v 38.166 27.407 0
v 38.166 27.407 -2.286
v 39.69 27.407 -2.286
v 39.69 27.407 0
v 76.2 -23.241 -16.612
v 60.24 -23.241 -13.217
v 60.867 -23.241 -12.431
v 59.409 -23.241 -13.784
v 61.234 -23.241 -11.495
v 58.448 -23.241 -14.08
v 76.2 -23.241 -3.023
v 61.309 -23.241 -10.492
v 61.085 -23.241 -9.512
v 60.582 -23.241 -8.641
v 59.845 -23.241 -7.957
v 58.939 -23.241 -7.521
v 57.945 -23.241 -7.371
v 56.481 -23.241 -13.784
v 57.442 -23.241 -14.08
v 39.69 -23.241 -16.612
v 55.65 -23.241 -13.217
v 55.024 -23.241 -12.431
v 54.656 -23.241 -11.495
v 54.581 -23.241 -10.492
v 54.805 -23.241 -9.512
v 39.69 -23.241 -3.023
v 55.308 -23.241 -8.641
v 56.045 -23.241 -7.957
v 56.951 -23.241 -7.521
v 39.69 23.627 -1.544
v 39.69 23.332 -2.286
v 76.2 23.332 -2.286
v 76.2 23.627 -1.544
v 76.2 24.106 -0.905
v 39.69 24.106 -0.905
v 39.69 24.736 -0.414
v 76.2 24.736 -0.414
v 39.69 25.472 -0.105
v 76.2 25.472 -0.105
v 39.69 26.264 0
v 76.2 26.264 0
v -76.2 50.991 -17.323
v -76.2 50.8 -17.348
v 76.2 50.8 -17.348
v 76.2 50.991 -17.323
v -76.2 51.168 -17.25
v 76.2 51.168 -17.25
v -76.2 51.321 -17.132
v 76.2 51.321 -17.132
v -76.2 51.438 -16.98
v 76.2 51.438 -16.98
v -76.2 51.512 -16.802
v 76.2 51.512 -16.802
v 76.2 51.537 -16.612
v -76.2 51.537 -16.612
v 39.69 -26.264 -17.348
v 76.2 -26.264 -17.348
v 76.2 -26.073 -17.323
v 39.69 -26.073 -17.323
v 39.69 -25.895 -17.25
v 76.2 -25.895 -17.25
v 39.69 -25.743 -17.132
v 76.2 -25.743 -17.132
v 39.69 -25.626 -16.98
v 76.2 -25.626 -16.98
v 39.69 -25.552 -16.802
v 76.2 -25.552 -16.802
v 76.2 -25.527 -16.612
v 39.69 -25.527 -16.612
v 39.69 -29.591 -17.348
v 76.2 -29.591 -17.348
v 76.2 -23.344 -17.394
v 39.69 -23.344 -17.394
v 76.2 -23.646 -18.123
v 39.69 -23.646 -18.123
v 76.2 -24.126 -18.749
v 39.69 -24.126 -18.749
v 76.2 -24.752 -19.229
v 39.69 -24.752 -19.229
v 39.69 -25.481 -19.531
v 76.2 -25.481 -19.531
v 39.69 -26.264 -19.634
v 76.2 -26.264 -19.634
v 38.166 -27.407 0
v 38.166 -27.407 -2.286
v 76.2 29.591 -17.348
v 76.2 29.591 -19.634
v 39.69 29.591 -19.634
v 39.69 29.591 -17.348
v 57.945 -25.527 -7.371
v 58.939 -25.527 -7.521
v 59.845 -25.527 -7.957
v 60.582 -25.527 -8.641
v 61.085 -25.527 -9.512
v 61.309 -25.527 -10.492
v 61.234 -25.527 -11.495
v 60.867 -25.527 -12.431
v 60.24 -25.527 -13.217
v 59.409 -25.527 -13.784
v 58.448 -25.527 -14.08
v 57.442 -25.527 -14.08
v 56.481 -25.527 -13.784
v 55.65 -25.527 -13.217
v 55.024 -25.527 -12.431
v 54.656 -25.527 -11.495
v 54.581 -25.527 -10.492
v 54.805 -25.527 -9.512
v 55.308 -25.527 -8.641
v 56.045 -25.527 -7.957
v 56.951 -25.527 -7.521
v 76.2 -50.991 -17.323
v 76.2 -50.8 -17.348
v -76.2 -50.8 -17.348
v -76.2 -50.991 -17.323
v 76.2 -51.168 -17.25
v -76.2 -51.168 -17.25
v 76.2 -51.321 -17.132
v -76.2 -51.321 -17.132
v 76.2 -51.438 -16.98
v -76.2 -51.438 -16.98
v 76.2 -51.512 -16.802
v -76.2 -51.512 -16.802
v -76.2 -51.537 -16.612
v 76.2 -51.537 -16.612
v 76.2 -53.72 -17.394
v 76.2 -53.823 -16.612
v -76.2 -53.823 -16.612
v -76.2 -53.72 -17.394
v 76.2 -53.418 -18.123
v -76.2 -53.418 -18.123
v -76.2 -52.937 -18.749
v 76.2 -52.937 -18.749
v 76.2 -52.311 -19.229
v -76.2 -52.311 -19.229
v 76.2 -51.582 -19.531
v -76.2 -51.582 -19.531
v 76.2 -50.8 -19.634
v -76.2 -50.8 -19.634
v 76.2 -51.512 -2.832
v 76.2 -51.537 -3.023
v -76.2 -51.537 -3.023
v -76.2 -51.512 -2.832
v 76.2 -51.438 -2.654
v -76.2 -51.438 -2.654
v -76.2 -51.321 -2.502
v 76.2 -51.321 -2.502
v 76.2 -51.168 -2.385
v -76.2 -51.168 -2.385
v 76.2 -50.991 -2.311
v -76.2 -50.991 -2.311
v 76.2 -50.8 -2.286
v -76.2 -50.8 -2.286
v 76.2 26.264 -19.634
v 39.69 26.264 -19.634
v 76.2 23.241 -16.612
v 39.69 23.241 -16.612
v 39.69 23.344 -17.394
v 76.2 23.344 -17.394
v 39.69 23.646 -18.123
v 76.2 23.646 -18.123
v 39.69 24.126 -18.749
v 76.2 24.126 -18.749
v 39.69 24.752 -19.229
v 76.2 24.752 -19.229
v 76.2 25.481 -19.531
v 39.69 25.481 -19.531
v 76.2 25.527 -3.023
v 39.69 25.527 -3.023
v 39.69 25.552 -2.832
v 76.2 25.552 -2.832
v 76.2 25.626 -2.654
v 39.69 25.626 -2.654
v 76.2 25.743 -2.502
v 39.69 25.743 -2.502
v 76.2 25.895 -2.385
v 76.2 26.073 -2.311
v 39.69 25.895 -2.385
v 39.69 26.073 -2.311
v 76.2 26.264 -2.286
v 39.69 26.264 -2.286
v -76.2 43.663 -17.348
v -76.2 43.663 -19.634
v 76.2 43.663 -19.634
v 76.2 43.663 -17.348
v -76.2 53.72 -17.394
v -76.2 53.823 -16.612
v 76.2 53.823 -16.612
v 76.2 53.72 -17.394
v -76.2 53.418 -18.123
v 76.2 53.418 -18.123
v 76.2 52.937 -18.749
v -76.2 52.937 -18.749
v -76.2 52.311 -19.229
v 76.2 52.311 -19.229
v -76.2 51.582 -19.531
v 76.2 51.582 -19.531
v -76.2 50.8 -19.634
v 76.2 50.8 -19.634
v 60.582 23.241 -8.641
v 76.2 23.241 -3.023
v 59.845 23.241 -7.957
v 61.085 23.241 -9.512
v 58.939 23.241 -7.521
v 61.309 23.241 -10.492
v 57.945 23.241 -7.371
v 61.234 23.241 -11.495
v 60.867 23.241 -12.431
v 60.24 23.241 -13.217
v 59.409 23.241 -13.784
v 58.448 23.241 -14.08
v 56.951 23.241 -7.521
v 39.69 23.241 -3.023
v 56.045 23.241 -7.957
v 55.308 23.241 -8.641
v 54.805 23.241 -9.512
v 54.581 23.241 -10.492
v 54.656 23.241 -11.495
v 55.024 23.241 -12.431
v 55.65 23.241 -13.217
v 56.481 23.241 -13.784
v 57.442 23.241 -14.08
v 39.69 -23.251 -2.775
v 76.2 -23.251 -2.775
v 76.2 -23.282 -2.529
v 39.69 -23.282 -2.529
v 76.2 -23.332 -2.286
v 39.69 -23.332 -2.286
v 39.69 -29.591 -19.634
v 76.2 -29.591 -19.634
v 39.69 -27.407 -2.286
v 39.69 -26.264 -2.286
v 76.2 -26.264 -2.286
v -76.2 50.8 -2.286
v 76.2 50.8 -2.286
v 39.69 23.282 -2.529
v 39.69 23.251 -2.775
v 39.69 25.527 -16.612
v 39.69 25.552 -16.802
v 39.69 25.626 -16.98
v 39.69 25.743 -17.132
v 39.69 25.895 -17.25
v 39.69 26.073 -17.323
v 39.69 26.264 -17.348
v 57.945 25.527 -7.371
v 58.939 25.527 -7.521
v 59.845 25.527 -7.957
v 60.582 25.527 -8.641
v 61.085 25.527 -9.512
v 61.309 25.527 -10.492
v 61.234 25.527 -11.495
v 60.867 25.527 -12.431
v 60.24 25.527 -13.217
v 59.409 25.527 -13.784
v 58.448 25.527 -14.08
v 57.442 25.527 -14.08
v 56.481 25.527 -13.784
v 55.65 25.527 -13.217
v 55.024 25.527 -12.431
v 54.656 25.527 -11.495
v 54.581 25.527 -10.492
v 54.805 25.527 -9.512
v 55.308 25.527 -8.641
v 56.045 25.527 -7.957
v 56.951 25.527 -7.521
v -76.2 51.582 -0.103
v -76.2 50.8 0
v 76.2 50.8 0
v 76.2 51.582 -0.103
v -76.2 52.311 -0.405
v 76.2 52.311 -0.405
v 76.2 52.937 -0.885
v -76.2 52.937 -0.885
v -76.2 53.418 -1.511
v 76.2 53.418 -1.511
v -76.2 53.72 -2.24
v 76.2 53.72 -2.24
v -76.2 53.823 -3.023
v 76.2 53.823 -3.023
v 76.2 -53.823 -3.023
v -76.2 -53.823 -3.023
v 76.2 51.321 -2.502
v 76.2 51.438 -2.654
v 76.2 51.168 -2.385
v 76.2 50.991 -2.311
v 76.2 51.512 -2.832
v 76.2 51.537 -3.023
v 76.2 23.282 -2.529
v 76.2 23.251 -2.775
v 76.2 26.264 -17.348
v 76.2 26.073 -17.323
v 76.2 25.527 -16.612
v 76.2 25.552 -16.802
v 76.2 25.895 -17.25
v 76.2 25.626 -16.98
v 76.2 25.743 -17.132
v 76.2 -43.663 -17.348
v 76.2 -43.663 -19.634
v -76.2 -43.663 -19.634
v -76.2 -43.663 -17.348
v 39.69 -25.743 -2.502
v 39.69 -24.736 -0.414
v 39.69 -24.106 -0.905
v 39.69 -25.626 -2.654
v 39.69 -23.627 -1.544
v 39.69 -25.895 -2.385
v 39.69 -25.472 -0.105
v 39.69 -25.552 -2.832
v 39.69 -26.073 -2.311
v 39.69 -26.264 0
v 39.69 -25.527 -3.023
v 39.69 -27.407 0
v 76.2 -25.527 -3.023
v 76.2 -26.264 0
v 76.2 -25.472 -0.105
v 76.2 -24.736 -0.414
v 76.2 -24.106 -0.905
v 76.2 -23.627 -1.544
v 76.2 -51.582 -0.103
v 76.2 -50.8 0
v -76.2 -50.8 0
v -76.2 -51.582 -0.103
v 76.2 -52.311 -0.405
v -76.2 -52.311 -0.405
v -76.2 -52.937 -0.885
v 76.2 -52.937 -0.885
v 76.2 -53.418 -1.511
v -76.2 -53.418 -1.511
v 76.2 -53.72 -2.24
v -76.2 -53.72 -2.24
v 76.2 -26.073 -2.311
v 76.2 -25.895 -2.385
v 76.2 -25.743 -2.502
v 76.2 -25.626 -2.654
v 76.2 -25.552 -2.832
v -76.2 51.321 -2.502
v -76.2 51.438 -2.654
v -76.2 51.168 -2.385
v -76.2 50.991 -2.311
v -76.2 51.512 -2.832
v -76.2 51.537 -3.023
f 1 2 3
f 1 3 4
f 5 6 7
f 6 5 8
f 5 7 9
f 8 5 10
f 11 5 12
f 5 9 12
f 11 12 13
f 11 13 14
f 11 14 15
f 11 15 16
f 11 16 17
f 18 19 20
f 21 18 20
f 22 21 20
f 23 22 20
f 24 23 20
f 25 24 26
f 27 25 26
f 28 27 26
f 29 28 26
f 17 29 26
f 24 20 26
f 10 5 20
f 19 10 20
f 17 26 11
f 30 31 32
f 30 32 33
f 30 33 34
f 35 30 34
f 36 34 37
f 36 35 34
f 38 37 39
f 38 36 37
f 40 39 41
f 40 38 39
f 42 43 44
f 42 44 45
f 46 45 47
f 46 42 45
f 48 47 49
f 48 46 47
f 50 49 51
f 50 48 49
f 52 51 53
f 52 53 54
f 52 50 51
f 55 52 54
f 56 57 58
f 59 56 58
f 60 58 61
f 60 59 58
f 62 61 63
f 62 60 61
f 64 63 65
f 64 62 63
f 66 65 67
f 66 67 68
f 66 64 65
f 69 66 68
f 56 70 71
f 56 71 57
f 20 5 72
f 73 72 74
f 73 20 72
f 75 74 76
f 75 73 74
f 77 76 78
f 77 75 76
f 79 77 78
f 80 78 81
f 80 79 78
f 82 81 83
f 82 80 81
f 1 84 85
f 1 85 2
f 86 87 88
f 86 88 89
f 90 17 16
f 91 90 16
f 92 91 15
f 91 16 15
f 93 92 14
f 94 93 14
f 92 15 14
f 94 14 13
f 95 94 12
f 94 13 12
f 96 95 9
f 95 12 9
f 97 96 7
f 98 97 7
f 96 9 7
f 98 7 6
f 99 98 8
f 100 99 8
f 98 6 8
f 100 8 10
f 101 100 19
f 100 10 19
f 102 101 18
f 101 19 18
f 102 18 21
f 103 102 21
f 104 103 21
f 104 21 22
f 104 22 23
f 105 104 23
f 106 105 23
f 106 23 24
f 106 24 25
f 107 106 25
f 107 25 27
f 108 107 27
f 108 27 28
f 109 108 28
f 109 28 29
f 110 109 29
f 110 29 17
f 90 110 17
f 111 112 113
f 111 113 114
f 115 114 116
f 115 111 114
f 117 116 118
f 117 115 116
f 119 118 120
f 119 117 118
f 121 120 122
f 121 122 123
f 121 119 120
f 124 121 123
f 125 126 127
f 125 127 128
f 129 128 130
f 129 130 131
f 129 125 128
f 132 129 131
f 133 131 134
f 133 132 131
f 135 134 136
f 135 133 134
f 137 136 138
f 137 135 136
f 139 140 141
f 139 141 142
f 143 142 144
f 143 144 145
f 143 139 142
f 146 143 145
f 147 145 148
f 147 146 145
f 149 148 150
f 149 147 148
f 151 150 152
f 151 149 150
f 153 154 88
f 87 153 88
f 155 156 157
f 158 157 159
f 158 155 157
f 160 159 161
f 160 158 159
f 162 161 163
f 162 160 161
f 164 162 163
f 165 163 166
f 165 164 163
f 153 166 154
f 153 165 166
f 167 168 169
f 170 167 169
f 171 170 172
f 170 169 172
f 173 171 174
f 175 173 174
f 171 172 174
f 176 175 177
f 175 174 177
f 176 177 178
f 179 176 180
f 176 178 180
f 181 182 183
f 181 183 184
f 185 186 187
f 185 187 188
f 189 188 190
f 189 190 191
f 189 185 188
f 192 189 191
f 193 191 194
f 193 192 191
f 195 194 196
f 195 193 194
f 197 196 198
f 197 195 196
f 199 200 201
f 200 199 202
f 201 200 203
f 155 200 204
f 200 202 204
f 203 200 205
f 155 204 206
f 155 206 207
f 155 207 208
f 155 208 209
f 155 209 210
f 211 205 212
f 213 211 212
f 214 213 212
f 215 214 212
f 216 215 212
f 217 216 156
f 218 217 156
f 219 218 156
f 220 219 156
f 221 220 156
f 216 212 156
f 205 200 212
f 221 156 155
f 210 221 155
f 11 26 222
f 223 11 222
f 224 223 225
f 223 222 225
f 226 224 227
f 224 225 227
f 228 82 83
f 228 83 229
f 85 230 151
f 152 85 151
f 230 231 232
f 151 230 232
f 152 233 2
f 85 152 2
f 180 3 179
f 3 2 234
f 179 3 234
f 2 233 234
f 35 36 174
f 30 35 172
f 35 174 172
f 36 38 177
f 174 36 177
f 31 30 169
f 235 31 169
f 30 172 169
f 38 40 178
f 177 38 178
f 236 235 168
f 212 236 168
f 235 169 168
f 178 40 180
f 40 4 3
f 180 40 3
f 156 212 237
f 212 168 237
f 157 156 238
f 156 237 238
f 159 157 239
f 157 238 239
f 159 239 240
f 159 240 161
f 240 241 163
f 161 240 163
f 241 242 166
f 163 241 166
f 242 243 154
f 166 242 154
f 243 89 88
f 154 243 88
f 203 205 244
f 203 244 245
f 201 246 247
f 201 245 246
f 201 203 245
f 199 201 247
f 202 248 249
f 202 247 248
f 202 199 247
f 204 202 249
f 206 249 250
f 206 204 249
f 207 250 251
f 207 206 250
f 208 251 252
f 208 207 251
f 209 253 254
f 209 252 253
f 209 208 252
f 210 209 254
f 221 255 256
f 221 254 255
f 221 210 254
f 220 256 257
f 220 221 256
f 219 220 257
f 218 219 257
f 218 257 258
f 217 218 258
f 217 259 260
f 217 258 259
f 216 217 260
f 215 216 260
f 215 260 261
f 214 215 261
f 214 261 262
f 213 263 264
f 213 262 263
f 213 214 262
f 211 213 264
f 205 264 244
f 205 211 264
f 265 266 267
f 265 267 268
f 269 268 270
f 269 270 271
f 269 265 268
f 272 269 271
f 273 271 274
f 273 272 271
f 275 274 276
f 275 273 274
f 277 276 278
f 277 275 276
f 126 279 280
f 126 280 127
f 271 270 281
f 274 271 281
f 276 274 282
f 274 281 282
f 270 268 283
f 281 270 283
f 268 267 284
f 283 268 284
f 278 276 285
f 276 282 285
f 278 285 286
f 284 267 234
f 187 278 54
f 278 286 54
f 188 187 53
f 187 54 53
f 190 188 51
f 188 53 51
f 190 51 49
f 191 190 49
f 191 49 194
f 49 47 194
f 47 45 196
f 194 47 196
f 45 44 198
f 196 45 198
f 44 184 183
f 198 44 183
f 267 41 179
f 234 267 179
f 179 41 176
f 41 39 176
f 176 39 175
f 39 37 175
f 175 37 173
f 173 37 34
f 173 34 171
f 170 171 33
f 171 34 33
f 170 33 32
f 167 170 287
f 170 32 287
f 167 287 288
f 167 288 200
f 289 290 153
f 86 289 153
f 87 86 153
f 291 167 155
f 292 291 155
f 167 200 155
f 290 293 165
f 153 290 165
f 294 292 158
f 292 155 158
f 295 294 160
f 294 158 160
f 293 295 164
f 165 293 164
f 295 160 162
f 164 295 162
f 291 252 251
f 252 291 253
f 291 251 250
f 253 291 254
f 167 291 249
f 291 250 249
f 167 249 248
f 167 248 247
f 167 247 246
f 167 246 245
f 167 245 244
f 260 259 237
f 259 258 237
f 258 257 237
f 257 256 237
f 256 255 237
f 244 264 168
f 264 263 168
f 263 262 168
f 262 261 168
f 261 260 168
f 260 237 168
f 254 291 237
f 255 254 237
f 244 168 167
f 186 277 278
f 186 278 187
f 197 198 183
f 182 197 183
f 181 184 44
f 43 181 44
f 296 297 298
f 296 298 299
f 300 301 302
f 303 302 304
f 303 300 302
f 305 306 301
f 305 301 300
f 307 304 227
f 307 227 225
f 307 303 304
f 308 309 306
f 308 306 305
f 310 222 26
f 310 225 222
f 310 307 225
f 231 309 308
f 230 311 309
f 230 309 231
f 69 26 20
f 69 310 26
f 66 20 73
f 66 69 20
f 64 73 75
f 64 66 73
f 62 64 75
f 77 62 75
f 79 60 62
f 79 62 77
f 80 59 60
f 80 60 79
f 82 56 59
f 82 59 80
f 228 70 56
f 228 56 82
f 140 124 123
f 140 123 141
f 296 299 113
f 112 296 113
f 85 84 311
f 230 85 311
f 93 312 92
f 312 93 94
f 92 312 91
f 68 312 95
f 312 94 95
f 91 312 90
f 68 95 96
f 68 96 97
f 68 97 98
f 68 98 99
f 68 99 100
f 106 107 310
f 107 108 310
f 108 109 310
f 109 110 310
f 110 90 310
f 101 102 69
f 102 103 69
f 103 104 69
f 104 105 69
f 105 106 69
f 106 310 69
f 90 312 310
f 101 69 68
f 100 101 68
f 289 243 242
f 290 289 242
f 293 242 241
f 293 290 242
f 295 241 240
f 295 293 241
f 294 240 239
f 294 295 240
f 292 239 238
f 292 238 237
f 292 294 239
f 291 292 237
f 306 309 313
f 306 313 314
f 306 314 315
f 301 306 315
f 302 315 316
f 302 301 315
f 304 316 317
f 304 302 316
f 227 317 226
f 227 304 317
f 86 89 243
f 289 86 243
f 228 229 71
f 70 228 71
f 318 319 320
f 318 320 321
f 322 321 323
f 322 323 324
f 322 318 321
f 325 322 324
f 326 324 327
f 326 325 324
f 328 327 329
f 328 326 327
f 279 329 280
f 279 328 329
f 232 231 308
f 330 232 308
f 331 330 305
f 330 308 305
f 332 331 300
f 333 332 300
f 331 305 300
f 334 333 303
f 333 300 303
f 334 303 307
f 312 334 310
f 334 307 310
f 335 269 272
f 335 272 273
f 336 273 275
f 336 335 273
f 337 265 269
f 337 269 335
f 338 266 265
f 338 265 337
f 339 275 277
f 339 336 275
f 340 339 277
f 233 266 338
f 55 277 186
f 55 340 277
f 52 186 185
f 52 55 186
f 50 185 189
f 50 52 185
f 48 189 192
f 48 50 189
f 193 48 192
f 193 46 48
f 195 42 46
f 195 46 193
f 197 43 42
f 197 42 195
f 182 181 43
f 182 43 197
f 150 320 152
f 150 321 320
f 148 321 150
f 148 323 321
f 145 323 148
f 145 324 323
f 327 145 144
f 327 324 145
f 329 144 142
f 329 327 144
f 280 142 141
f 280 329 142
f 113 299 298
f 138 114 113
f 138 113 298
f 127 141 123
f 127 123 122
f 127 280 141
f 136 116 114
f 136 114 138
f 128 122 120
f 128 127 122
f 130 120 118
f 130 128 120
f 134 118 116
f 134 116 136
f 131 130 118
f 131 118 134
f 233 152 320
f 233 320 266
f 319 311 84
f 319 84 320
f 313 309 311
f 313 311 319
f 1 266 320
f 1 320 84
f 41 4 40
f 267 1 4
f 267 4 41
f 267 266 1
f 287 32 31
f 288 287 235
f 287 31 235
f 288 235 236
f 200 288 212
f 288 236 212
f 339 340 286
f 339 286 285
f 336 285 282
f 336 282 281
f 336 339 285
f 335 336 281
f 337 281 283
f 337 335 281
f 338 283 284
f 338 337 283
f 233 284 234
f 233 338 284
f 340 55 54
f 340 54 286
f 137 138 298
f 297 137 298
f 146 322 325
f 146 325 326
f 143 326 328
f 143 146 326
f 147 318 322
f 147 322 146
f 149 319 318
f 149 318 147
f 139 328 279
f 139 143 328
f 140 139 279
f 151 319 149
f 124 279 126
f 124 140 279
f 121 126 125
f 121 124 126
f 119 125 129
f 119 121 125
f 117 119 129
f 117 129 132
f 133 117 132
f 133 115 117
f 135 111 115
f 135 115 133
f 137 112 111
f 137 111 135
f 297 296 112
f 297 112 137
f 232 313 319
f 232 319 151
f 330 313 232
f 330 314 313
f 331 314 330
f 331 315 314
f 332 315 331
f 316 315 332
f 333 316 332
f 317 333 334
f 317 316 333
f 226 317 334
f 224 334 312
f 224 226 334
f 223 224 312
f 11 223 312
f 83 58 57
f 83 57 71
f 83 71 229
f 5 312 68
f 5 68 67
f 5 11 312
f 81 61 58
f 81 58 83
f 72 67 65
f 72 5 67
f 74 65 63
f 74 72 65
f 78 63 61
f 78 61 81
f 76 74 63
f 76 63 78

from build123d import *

# Parameters (mm, degrees)
SKETCH1_W                      = 152.4
SKETCH1_H                      = 101.6
BASE_FLANGE1_DEPTH             = 2.286
EDGE_FLANGE1_DEPTH             = 152.4
EDGE_FLANGE2_DEPTH             = 152.4
SKETCH14_W                     = 36.50996
SKETCH14_H                     = 46.482
CUT_EXTRUDE1_DEPTH             = 96.335271964
EDGE_FLANGE3_START             = 38.54704
EDGE_FLANGE3_DEPTH             = 37.65296
EDGE_FLANGE3_2_DEPTH           = 1.143
EDGE_FLANGE3_START_2           = 39.69004
EDGE_FLANGE3_3_DEPTH           = 36.50996
EDGE_FLANGE4_START             = 38.54704
EDGE_FLANGE4_DEPTH             = 37.65296
EDGE_FLANGE4_2_DEPTH           = 1.143
EDGE_FLANGE4_START_2           = 39.69004
EDGE_FLANGE4_3_DEPTH           = 36.50996
CUT_EXTRUDE3_REACH             = 112.14
SKETCH22_R                     = 3.3734375
CUT_EXTRUDE3_DIRECTION_2_REACH = 112.14
EDGE_FLANGE5_STRIP_W           = 10.6172
EDGE_FLANGE5_STRIP_H           = 2.286
EDGE_FLANGE5_STRIP_CUT_DEPTH   = 36.50996
EDGE_FLANGE5_DEPTH             = 36.50996
EDGE_FLANGE6_STRIP_W           = 10.6172
EDGE_FLANGE6_STRIP_H           = 2.286
EDGE_FLANGE6_STRIP_CUT_DEPTH   = 36.50996
EDGE_FLANGE6_DEPTH             = 36.50996
EDGE_FLANGE7_STRIP_W           = 10.6172
EDGE_FLANGE7_STRIP_H           = 2.286
EDGE_FLANGE7_STRIP_CUT_DEPTH   = 152.4
EDGE_FLANGE7_DEPTH             = 152.4
EDGE_FLANGE8_STRIP_W           = 10.6172
EDGE_FLANGE8_STRIP_H           = 2.286
EDGE_FLANGE8_STRIP_CUT_DEPTH   = 152.4
EDGE_FLANGE8_DEPTH             = 152.4
SKETCH35_W                     = 1.524
SKETCH35_H                     = 54.8132
CUT_EXTRUDE4_DEPTH             = 96.335271964


# Read off the part's stored shape, not the designer's step: Edge-Flange3, Edge-Flange4
# Sheet-metal steps are written as plain solids
with BuildPart() as part:
    # Sketch1 → Base-Flange1 (new body)
    with BuildSketch(Plane.XY):
        Rectangle(SKETCH1_W, SKETCH1_H)
    extrude(amount=-BASE_FLANGE1_DEPTH)

    # Edge-Flange1 section (across the edge) → Edge-Flange1 (add)
    with BuildSketch(Plane(origin=(-76.2, 51.5366, -2.286), x_dir=(0, -1, 0), z_dir=(1, 0, 0))):
        with BuildLine():
            Line((-2.286, 0.7366), (-2.286, 17.3482))
            Line((-2.286, 17.3482), (0, 17.3482))
            Line((0, 17.3482), (0, 0.7366))
            ThreePointArc((0, 0.7366), (0.215745145, 0.215745145), (0.7366, 0))
            Line((0.7366, 0), (0.7366, -2.286))
            ThreePointArc((0.7366, -2.286), (-1.400700957, -1.400700957), (-2.286, 0.7366))
        make_face()
    extrude(amount=EDGE_FLANGE1_DEPTH)

    # Edge-Flange2 section (across the edge) → Edge-Flange2 (add)
    with BuildSketch(Plane(origin=(76.2, -51.5366, -2.286), x_dir=(0, 1, 0), z_dir=(-1, 0, 0))):
        with BuildLine():
            Line((-2.286, 0.7366), (-2.286, 17.3482))
            Line((-2.286, 17.3482), (0, 17.3482))
            Line((0, 17.3482), (0, 0.7366))
            ThreePointArc((0, 0.7366), (0.215745145, 0.215745145), (0.7366, 0))
            Line((0.7366, 0), (0.7366, -2.286))
            ThreePointArc((0.7366, -2.286), (-1.400700957, -1.400700957), (-2.286, 0.7366))
        make_face()
    extrude(amount=EDGE_FLANGE2_DEPTH)

    # Sketch14 → Cut-Extrude1 (cut, through all)
    with BuildSketch(Plane.XY):
        with Locations((57.94502, 0)):
            Rectangle(SKETCH14_W, SKETCH14_H)
    extrude(amount=-CUT_EXTRUDE1_DEPTH, mode=Mode.SUBTRACT)

    # Edge-Flange3 outline → Edge-Flange3 (cut)
    with BuildSketch(Plane.YZ.offset(EDGE_FLANGE3_START)):
        with BuildLine():
            ThreePointArc((-26.2636, 0), (-24.404882216, -0.639056638), (-23.332127469, -2.286))
            Line((-23.332127469, -2.286), (-23.241, -2.286))
            Line((-23.241, -2.286), (-23.241, 0))
            Line((-23.241, 0), (-26.2636, 0))
        make_face()
    extrude(amount=EDGE_FLANGE3_DEPTH, mode=Mode.SUBTRACT)

    # Edge-Flange3 2 outline → Edge-Flange3 2 (cut)
    with BuildSketch(Plane.YZ.offset(EDGE_FLANGE3_START)):
        with BuildLine():
            Line((-27.4066, -2.286), (-23.332127469, -2.286))
            ThreePointArc((-23.332127469, -2.286), (-24.404882216, -0.639056638), (-26.2636, 0))
            Line((-26.2636, 0), (-27.4066, 0))
            Line((-27.4066, 0), (-27.4066, -2.286))
        make_face()
    extrude(amount=EDGE_FLANGE3_2_DEPTH, mode=Mode.SUBTRACT)

    # Edge-Flange3 3 outline → Edge-Flange3 3 (add)
    with BuildSketch(Plane.YZ.offset(EDGE_FLANGE3_START_2)):
        with BuildLine():
            Line((-25.527, -19.6342), (-23.241, -19.6342))
            Line((-23.241, -19.6342), (-23.241, -3.0226))
            ThreePointArc((-23.241, -3.0226), (-23.263868376, -2.651492275), (-23.332127469, -2.286))
            Line((-23.332127469, -2.286), (-26.2636, -2.286))
            ThreePointArc((-26.2636, -2.286), (-25.742745145, -2.501745145), (-25.527, -3.0226))
            Line((-25.527, -3.0226), (-25.527, -19.6342))
        make_face()
    extrude(amount=EDGE_FLANGE3_3_DEPTH)

    # Edge-Flange4 outline → Edge-Flange4 (cut)
    with BuildSketch(Plane.YZ.offset(EDGE_FLANGE4_START)):
        with BuildLine():
            Line((23.241, -2.286), (23.332127469, -2.286))
            ThreePointArc((23.332127469, -2.286), (24.404882216, -0.639056638), (26.2636, 0))
            Line((26.2636, 0), (23.241, 0))
            Line((23.241, 0), (23.241, -2.286))
        make_face()
    extrude(amount=EDGE_FLANGE4_DEPTH, mode=Mode.SUBTRACT)

    # Edge-Flange4 2 outline → Edge-Flange4 2 (cut)
    with BuildSketch(Plane.YZ.offset(EDGE_FLANGE4_START)):
        with BuildLine():
            Line((23.332127469, -2.286), (27.4066, -2.286))
            Line((27.4066, -2.286), (27.4066, 0))
            Line((27.4066, 0), (26.2636, 0))
            ThreePointArc((26.2636, 0), (24.404882216, -0.639056638), (23.332127469, -2.286))
        make_face()
    extrude(amount=EDGE_FLANGE4_2_DEPTH, mode=Mode.SUBTRACT)

    # Edge-Flange4 3 outline → Edge-Flange4 3 (add)
    with BuildSketch(Plane.YZ.offset(EDGE_FLANGE4_START_2)):
        with BuildLine():
            Line((23.241, -19.6342), (25.527, -19.6342))
            Line((25.527, -19.6342), (25.527, -3.0226))
            ThreePointArc((25.527, -3.0226), (25.742745145, -2.501745145), (26.2636, -2.286))
            Line((26.2636, -2.286), (23.332127469, -2.286))
            ThreePointArc((23.332127469, -2.286), (23.263868376, -2.651492275), (23.241, -3.0226))
            Line((23.241, -3.0226), (23.241, -19.6342))
        make_face()
    extrude(amount=EDGE_FLANGE4_3_DEPTH)

    # Cut-Extrude3: up to this face of the body (flat: up to its plane)
    cut_extrude3_end = Plane(part.part.faces().sort_by_distance((57.94502, -25.527, -11.3284))[0])
    # Sketch22 → Cut-Extrude3 (cut, up to the picked face)
    with BuildSketch(Plane(origin=(0, -23.241, 0), x_dir=(1, 0, 0), z_dir=(0, 1, 0)), mode=Mode.PRIVATE) as cut_extrude3_sk1:
        with Locations(Location((57.94502, 10.7442, 0), (0, 0, 270))):
            Circle(SKETCH22_R)
    cut_extrude3_tool1 = split(extrude(cut_extrude3_sk1.sketch, amount=-CUT_EXTRUDE3_REACH, mode=Mode.PRIVATE), bisect_by=cut_extrude3_end, keep=Keep.BOTH, mode=Mode.PRIVATE)
    add(cut_extrude3_tool1.solids().sort_by(Axis((57.94502, -23.241, -10.7442), (0, -1, 0)))[0], mode=Mode.SUBTRACT)

    # Cut-Extrude3 direction 2: up to this face of the body (flat: up to its plane)
    cut_extrude3_direction_2_end = Plane(part.part.faces().sort_by_distance((57.94502, 25.527, -11.3284))[0])
    # Sketch22 → Cut-Extrude3 direction 2 (cut, up to the picked face)
    with BuildSketch(Plane(origin=(0, -23.241, 0), x_dir=(1, 0, 0), z_dir=(0, 1, 0)), mode=Mode.PRIVATE) as cut_extrude3_direction_2_sk1:
        with Locations(Location((57.94502, 10.7442, 0), (0, 0, 270))):
            Circle(SKETCH22_R)
    cut_extrude3_direction_2_tool1 = split(extrude(cut_extrude3_direction_2_sk1.sketch, amount=CUT_EXTRUDE3_DIRECTION_2_REACH, mode=Mode.PRIVATE), bisect_by=cut_extrude3_direction_2_end, keep=Keep.BOTH, mode=Mode.PRIVATE)
    add(cut_extrude3_direction_2_tool1.solids().sort_by(Axis((57.94502, -23.241, -10.7442), (0, 1, 0)))[0], mode=Mode.SUBTRACT)

    # Edge-Flange5 strip (across the edge) → Edge-Flange5 strip cut (cut)
    with BuildSketch(Plane(origin=(39.69004, -25.527, -19.6342), x_dir=(0, 0, 1), z_dir=(1, 0, 0))):
        with Locations((-2.286, -1.143)):
            Rectangle(EDGE_FLANGE5_STRIP_W, EDGE_FLANGE5_STRIP_H)
    extrude(amount=EDGE_FLANGE5_STRIP_CUT_DEPTH, mode=Mode.SUBTRACT)

    # Edge-Flange5 section (across the edge) → Edge-Flange5 (add)
    with BuildSketch(Plane(origin=(39.69004, -25.527, -19.6342), x_dir=(0, 0, 1), z_dir=(1, 0, 0))):
        with BuildLine():
            Line((0, 0.7366), (0, 4.064))
            Line((0, 4.064), (2.286, 4.064))
            Line((2.286, 4.064), (2.286, 0.7366))
            ThreePointArc((2.286, 0.7366), (2.501745145, 0.215745145), (3.0226, 0))
            Line((3.0226, 0), (3.0226, -2.286))
            ThreePointArc((3.0226, -2.286), (0.885299043, -1.400700957), (0, 0.7366))
        make_face()
    extrude(amount=EDGE_FLANGE5_DEPTH)

    # Edge-Flange6 strip (across the edge) → Edge-Flange6 strip cut (cut)
    with BuildSketch(Plane(origin=(76.2, 25.527, -19.6342), x_dir=(0, 0, 1), z_dir=(-1, 0, 0))):
        with Locations((-2.286, -1.143)):
            Rectangle(EDGE_FLANGE6_STRIP_W, EDGE_FLANGE6_STRIP_H)
    extrude(amount=EDGE_FLANGE6_STRIP_CUT_DEPTH, mode=Mode.SUBTRACT)

    # Edge-Flange6 section (across the edge) → Edge-Flange6 (add)
    with BuildSketch(Plane(origin=(76.2, 25.527, -19.6342), x_dir=(0, 0, 1), z_dir=(-1, 0, 0))):
        with BuildLine():
            Line((0, 0.7366), (0, 4.064))
            Line((0, 4.064), (2.286, 4.064))
            Line((2.286, 4.064), (2.286, 0.7366))
            ThreePointArc((2.286, 0.7366), (2.501745145, 0.215745145), (3.0226, 0))
            Line((3.0226, 0), (3.0226, -2.286))
            ThreePointArc((3.0226, -2.286), (0.885299043, -1.400700957), (0, 0.7366))
        make_face()
    extrude(amount=EDGE_FLANGE6_DEPTH)

    # Edge-Flange7 strip (across the edge) → Edge-Flange7 strip cut (cut)
    with BuildSketch(Plane(origin=(76.2, -51.5366, -19.6342), x_dir=(0, 0, 1), z_dir=(-1, 0, 0))):
        with Locations((-2.286, -1.143)):
            Rectangle(EDGE_FLANGE7_STRIP_W, EDGE_FLANGE7_STRIP_H)
    extrude(amount=EDGE_FLANGE7_STRIP_CUT_DEPTH, mode=Mode.SUBTRACT)

    # Edge-Flange7 section (across the edge) → Edge-Flange7 (add)
    with BuildSketch(Plane(origin=(76.2, -51.5366, -19.6342), x_dir=(0, 0, 1), z_dir=(-1, 0, 0))):
        with BuildLine():
            Line((0, 0.7366), (0, 7.874))
            Line((0, 7.874), (2.286, 7.874))
            Line((2.286, 7.874), (2.286, 0.7366))
            ThreePointArc((2.286, 0.7366), (2.501745145, 0.215745145), (3.0226, 0))
            Line((3.0226, 0), (3.0226, -2.286))
            ThreePointArc((3.0226, -2.286), (0.885299043, -1.400700957), (0, 0.7366))
        make_face()
    extrude(amount=EDGE_FLANGE7_DEPTH)

    # Edge-Flange8 strip (across the edge) → Edge-Flange8 strip cut (cut)
    with BuildSketch(Plane(origin=(-76.2, 51.5366, -19.6342), x_dir=(0, 0, 1), z_dir=(1, 0, 0))):
        with Locations((-2.286, -1.143)):
            Rectangle(EDGE_FLANGE8_STRIP_W, EDGE_FLANGE8_STRIP_H)
    extrude(amount=EDGE_FLANGE8_STRIP_CUT_DEPTH, mode=Mode.SUBTRACT)

    # Edge-Flange8 section (across the edge) → Edge-Flange8 (add)
    with BuildSketch(Plane(origin=(-76.2, 51.5366, -19.6342), x_dir=(0, 0, 1), z_dir=(1, 0, 0))):
        with BuildLine():
            Line((0, 0.7366), (0, 7.874))
            Line((0, 7.874), (2.286, 7.874))
            Line((2.286, 7.874), (2.286, 0.7366))
            ThreePointArc((2.286, 0.7366), (2.501745145, 0.215745145), (3.0226, 0))
            Line((3.0226, 0), (3.0226, -2.286))
            ThreePointArc((3.0226, -2.286), (0.885299043, -1.400700957), (0, 0.7366))
        make_face()
    extrude(amount=EDGE_FLANGE8_DEPTH)

    # Sketch35 → Cut-Extrude4 (cut, through all)
    with BuildSketch(Plane.XY):
        with Locations((38.92804, 0)):
            Rectangle(SKETCH35_W, SKETCH35_H)
    extrude(amount=-CUT_EXTRUDE4_DEPTH, mode=Mode.SUBTRACT)


solid = part.part
